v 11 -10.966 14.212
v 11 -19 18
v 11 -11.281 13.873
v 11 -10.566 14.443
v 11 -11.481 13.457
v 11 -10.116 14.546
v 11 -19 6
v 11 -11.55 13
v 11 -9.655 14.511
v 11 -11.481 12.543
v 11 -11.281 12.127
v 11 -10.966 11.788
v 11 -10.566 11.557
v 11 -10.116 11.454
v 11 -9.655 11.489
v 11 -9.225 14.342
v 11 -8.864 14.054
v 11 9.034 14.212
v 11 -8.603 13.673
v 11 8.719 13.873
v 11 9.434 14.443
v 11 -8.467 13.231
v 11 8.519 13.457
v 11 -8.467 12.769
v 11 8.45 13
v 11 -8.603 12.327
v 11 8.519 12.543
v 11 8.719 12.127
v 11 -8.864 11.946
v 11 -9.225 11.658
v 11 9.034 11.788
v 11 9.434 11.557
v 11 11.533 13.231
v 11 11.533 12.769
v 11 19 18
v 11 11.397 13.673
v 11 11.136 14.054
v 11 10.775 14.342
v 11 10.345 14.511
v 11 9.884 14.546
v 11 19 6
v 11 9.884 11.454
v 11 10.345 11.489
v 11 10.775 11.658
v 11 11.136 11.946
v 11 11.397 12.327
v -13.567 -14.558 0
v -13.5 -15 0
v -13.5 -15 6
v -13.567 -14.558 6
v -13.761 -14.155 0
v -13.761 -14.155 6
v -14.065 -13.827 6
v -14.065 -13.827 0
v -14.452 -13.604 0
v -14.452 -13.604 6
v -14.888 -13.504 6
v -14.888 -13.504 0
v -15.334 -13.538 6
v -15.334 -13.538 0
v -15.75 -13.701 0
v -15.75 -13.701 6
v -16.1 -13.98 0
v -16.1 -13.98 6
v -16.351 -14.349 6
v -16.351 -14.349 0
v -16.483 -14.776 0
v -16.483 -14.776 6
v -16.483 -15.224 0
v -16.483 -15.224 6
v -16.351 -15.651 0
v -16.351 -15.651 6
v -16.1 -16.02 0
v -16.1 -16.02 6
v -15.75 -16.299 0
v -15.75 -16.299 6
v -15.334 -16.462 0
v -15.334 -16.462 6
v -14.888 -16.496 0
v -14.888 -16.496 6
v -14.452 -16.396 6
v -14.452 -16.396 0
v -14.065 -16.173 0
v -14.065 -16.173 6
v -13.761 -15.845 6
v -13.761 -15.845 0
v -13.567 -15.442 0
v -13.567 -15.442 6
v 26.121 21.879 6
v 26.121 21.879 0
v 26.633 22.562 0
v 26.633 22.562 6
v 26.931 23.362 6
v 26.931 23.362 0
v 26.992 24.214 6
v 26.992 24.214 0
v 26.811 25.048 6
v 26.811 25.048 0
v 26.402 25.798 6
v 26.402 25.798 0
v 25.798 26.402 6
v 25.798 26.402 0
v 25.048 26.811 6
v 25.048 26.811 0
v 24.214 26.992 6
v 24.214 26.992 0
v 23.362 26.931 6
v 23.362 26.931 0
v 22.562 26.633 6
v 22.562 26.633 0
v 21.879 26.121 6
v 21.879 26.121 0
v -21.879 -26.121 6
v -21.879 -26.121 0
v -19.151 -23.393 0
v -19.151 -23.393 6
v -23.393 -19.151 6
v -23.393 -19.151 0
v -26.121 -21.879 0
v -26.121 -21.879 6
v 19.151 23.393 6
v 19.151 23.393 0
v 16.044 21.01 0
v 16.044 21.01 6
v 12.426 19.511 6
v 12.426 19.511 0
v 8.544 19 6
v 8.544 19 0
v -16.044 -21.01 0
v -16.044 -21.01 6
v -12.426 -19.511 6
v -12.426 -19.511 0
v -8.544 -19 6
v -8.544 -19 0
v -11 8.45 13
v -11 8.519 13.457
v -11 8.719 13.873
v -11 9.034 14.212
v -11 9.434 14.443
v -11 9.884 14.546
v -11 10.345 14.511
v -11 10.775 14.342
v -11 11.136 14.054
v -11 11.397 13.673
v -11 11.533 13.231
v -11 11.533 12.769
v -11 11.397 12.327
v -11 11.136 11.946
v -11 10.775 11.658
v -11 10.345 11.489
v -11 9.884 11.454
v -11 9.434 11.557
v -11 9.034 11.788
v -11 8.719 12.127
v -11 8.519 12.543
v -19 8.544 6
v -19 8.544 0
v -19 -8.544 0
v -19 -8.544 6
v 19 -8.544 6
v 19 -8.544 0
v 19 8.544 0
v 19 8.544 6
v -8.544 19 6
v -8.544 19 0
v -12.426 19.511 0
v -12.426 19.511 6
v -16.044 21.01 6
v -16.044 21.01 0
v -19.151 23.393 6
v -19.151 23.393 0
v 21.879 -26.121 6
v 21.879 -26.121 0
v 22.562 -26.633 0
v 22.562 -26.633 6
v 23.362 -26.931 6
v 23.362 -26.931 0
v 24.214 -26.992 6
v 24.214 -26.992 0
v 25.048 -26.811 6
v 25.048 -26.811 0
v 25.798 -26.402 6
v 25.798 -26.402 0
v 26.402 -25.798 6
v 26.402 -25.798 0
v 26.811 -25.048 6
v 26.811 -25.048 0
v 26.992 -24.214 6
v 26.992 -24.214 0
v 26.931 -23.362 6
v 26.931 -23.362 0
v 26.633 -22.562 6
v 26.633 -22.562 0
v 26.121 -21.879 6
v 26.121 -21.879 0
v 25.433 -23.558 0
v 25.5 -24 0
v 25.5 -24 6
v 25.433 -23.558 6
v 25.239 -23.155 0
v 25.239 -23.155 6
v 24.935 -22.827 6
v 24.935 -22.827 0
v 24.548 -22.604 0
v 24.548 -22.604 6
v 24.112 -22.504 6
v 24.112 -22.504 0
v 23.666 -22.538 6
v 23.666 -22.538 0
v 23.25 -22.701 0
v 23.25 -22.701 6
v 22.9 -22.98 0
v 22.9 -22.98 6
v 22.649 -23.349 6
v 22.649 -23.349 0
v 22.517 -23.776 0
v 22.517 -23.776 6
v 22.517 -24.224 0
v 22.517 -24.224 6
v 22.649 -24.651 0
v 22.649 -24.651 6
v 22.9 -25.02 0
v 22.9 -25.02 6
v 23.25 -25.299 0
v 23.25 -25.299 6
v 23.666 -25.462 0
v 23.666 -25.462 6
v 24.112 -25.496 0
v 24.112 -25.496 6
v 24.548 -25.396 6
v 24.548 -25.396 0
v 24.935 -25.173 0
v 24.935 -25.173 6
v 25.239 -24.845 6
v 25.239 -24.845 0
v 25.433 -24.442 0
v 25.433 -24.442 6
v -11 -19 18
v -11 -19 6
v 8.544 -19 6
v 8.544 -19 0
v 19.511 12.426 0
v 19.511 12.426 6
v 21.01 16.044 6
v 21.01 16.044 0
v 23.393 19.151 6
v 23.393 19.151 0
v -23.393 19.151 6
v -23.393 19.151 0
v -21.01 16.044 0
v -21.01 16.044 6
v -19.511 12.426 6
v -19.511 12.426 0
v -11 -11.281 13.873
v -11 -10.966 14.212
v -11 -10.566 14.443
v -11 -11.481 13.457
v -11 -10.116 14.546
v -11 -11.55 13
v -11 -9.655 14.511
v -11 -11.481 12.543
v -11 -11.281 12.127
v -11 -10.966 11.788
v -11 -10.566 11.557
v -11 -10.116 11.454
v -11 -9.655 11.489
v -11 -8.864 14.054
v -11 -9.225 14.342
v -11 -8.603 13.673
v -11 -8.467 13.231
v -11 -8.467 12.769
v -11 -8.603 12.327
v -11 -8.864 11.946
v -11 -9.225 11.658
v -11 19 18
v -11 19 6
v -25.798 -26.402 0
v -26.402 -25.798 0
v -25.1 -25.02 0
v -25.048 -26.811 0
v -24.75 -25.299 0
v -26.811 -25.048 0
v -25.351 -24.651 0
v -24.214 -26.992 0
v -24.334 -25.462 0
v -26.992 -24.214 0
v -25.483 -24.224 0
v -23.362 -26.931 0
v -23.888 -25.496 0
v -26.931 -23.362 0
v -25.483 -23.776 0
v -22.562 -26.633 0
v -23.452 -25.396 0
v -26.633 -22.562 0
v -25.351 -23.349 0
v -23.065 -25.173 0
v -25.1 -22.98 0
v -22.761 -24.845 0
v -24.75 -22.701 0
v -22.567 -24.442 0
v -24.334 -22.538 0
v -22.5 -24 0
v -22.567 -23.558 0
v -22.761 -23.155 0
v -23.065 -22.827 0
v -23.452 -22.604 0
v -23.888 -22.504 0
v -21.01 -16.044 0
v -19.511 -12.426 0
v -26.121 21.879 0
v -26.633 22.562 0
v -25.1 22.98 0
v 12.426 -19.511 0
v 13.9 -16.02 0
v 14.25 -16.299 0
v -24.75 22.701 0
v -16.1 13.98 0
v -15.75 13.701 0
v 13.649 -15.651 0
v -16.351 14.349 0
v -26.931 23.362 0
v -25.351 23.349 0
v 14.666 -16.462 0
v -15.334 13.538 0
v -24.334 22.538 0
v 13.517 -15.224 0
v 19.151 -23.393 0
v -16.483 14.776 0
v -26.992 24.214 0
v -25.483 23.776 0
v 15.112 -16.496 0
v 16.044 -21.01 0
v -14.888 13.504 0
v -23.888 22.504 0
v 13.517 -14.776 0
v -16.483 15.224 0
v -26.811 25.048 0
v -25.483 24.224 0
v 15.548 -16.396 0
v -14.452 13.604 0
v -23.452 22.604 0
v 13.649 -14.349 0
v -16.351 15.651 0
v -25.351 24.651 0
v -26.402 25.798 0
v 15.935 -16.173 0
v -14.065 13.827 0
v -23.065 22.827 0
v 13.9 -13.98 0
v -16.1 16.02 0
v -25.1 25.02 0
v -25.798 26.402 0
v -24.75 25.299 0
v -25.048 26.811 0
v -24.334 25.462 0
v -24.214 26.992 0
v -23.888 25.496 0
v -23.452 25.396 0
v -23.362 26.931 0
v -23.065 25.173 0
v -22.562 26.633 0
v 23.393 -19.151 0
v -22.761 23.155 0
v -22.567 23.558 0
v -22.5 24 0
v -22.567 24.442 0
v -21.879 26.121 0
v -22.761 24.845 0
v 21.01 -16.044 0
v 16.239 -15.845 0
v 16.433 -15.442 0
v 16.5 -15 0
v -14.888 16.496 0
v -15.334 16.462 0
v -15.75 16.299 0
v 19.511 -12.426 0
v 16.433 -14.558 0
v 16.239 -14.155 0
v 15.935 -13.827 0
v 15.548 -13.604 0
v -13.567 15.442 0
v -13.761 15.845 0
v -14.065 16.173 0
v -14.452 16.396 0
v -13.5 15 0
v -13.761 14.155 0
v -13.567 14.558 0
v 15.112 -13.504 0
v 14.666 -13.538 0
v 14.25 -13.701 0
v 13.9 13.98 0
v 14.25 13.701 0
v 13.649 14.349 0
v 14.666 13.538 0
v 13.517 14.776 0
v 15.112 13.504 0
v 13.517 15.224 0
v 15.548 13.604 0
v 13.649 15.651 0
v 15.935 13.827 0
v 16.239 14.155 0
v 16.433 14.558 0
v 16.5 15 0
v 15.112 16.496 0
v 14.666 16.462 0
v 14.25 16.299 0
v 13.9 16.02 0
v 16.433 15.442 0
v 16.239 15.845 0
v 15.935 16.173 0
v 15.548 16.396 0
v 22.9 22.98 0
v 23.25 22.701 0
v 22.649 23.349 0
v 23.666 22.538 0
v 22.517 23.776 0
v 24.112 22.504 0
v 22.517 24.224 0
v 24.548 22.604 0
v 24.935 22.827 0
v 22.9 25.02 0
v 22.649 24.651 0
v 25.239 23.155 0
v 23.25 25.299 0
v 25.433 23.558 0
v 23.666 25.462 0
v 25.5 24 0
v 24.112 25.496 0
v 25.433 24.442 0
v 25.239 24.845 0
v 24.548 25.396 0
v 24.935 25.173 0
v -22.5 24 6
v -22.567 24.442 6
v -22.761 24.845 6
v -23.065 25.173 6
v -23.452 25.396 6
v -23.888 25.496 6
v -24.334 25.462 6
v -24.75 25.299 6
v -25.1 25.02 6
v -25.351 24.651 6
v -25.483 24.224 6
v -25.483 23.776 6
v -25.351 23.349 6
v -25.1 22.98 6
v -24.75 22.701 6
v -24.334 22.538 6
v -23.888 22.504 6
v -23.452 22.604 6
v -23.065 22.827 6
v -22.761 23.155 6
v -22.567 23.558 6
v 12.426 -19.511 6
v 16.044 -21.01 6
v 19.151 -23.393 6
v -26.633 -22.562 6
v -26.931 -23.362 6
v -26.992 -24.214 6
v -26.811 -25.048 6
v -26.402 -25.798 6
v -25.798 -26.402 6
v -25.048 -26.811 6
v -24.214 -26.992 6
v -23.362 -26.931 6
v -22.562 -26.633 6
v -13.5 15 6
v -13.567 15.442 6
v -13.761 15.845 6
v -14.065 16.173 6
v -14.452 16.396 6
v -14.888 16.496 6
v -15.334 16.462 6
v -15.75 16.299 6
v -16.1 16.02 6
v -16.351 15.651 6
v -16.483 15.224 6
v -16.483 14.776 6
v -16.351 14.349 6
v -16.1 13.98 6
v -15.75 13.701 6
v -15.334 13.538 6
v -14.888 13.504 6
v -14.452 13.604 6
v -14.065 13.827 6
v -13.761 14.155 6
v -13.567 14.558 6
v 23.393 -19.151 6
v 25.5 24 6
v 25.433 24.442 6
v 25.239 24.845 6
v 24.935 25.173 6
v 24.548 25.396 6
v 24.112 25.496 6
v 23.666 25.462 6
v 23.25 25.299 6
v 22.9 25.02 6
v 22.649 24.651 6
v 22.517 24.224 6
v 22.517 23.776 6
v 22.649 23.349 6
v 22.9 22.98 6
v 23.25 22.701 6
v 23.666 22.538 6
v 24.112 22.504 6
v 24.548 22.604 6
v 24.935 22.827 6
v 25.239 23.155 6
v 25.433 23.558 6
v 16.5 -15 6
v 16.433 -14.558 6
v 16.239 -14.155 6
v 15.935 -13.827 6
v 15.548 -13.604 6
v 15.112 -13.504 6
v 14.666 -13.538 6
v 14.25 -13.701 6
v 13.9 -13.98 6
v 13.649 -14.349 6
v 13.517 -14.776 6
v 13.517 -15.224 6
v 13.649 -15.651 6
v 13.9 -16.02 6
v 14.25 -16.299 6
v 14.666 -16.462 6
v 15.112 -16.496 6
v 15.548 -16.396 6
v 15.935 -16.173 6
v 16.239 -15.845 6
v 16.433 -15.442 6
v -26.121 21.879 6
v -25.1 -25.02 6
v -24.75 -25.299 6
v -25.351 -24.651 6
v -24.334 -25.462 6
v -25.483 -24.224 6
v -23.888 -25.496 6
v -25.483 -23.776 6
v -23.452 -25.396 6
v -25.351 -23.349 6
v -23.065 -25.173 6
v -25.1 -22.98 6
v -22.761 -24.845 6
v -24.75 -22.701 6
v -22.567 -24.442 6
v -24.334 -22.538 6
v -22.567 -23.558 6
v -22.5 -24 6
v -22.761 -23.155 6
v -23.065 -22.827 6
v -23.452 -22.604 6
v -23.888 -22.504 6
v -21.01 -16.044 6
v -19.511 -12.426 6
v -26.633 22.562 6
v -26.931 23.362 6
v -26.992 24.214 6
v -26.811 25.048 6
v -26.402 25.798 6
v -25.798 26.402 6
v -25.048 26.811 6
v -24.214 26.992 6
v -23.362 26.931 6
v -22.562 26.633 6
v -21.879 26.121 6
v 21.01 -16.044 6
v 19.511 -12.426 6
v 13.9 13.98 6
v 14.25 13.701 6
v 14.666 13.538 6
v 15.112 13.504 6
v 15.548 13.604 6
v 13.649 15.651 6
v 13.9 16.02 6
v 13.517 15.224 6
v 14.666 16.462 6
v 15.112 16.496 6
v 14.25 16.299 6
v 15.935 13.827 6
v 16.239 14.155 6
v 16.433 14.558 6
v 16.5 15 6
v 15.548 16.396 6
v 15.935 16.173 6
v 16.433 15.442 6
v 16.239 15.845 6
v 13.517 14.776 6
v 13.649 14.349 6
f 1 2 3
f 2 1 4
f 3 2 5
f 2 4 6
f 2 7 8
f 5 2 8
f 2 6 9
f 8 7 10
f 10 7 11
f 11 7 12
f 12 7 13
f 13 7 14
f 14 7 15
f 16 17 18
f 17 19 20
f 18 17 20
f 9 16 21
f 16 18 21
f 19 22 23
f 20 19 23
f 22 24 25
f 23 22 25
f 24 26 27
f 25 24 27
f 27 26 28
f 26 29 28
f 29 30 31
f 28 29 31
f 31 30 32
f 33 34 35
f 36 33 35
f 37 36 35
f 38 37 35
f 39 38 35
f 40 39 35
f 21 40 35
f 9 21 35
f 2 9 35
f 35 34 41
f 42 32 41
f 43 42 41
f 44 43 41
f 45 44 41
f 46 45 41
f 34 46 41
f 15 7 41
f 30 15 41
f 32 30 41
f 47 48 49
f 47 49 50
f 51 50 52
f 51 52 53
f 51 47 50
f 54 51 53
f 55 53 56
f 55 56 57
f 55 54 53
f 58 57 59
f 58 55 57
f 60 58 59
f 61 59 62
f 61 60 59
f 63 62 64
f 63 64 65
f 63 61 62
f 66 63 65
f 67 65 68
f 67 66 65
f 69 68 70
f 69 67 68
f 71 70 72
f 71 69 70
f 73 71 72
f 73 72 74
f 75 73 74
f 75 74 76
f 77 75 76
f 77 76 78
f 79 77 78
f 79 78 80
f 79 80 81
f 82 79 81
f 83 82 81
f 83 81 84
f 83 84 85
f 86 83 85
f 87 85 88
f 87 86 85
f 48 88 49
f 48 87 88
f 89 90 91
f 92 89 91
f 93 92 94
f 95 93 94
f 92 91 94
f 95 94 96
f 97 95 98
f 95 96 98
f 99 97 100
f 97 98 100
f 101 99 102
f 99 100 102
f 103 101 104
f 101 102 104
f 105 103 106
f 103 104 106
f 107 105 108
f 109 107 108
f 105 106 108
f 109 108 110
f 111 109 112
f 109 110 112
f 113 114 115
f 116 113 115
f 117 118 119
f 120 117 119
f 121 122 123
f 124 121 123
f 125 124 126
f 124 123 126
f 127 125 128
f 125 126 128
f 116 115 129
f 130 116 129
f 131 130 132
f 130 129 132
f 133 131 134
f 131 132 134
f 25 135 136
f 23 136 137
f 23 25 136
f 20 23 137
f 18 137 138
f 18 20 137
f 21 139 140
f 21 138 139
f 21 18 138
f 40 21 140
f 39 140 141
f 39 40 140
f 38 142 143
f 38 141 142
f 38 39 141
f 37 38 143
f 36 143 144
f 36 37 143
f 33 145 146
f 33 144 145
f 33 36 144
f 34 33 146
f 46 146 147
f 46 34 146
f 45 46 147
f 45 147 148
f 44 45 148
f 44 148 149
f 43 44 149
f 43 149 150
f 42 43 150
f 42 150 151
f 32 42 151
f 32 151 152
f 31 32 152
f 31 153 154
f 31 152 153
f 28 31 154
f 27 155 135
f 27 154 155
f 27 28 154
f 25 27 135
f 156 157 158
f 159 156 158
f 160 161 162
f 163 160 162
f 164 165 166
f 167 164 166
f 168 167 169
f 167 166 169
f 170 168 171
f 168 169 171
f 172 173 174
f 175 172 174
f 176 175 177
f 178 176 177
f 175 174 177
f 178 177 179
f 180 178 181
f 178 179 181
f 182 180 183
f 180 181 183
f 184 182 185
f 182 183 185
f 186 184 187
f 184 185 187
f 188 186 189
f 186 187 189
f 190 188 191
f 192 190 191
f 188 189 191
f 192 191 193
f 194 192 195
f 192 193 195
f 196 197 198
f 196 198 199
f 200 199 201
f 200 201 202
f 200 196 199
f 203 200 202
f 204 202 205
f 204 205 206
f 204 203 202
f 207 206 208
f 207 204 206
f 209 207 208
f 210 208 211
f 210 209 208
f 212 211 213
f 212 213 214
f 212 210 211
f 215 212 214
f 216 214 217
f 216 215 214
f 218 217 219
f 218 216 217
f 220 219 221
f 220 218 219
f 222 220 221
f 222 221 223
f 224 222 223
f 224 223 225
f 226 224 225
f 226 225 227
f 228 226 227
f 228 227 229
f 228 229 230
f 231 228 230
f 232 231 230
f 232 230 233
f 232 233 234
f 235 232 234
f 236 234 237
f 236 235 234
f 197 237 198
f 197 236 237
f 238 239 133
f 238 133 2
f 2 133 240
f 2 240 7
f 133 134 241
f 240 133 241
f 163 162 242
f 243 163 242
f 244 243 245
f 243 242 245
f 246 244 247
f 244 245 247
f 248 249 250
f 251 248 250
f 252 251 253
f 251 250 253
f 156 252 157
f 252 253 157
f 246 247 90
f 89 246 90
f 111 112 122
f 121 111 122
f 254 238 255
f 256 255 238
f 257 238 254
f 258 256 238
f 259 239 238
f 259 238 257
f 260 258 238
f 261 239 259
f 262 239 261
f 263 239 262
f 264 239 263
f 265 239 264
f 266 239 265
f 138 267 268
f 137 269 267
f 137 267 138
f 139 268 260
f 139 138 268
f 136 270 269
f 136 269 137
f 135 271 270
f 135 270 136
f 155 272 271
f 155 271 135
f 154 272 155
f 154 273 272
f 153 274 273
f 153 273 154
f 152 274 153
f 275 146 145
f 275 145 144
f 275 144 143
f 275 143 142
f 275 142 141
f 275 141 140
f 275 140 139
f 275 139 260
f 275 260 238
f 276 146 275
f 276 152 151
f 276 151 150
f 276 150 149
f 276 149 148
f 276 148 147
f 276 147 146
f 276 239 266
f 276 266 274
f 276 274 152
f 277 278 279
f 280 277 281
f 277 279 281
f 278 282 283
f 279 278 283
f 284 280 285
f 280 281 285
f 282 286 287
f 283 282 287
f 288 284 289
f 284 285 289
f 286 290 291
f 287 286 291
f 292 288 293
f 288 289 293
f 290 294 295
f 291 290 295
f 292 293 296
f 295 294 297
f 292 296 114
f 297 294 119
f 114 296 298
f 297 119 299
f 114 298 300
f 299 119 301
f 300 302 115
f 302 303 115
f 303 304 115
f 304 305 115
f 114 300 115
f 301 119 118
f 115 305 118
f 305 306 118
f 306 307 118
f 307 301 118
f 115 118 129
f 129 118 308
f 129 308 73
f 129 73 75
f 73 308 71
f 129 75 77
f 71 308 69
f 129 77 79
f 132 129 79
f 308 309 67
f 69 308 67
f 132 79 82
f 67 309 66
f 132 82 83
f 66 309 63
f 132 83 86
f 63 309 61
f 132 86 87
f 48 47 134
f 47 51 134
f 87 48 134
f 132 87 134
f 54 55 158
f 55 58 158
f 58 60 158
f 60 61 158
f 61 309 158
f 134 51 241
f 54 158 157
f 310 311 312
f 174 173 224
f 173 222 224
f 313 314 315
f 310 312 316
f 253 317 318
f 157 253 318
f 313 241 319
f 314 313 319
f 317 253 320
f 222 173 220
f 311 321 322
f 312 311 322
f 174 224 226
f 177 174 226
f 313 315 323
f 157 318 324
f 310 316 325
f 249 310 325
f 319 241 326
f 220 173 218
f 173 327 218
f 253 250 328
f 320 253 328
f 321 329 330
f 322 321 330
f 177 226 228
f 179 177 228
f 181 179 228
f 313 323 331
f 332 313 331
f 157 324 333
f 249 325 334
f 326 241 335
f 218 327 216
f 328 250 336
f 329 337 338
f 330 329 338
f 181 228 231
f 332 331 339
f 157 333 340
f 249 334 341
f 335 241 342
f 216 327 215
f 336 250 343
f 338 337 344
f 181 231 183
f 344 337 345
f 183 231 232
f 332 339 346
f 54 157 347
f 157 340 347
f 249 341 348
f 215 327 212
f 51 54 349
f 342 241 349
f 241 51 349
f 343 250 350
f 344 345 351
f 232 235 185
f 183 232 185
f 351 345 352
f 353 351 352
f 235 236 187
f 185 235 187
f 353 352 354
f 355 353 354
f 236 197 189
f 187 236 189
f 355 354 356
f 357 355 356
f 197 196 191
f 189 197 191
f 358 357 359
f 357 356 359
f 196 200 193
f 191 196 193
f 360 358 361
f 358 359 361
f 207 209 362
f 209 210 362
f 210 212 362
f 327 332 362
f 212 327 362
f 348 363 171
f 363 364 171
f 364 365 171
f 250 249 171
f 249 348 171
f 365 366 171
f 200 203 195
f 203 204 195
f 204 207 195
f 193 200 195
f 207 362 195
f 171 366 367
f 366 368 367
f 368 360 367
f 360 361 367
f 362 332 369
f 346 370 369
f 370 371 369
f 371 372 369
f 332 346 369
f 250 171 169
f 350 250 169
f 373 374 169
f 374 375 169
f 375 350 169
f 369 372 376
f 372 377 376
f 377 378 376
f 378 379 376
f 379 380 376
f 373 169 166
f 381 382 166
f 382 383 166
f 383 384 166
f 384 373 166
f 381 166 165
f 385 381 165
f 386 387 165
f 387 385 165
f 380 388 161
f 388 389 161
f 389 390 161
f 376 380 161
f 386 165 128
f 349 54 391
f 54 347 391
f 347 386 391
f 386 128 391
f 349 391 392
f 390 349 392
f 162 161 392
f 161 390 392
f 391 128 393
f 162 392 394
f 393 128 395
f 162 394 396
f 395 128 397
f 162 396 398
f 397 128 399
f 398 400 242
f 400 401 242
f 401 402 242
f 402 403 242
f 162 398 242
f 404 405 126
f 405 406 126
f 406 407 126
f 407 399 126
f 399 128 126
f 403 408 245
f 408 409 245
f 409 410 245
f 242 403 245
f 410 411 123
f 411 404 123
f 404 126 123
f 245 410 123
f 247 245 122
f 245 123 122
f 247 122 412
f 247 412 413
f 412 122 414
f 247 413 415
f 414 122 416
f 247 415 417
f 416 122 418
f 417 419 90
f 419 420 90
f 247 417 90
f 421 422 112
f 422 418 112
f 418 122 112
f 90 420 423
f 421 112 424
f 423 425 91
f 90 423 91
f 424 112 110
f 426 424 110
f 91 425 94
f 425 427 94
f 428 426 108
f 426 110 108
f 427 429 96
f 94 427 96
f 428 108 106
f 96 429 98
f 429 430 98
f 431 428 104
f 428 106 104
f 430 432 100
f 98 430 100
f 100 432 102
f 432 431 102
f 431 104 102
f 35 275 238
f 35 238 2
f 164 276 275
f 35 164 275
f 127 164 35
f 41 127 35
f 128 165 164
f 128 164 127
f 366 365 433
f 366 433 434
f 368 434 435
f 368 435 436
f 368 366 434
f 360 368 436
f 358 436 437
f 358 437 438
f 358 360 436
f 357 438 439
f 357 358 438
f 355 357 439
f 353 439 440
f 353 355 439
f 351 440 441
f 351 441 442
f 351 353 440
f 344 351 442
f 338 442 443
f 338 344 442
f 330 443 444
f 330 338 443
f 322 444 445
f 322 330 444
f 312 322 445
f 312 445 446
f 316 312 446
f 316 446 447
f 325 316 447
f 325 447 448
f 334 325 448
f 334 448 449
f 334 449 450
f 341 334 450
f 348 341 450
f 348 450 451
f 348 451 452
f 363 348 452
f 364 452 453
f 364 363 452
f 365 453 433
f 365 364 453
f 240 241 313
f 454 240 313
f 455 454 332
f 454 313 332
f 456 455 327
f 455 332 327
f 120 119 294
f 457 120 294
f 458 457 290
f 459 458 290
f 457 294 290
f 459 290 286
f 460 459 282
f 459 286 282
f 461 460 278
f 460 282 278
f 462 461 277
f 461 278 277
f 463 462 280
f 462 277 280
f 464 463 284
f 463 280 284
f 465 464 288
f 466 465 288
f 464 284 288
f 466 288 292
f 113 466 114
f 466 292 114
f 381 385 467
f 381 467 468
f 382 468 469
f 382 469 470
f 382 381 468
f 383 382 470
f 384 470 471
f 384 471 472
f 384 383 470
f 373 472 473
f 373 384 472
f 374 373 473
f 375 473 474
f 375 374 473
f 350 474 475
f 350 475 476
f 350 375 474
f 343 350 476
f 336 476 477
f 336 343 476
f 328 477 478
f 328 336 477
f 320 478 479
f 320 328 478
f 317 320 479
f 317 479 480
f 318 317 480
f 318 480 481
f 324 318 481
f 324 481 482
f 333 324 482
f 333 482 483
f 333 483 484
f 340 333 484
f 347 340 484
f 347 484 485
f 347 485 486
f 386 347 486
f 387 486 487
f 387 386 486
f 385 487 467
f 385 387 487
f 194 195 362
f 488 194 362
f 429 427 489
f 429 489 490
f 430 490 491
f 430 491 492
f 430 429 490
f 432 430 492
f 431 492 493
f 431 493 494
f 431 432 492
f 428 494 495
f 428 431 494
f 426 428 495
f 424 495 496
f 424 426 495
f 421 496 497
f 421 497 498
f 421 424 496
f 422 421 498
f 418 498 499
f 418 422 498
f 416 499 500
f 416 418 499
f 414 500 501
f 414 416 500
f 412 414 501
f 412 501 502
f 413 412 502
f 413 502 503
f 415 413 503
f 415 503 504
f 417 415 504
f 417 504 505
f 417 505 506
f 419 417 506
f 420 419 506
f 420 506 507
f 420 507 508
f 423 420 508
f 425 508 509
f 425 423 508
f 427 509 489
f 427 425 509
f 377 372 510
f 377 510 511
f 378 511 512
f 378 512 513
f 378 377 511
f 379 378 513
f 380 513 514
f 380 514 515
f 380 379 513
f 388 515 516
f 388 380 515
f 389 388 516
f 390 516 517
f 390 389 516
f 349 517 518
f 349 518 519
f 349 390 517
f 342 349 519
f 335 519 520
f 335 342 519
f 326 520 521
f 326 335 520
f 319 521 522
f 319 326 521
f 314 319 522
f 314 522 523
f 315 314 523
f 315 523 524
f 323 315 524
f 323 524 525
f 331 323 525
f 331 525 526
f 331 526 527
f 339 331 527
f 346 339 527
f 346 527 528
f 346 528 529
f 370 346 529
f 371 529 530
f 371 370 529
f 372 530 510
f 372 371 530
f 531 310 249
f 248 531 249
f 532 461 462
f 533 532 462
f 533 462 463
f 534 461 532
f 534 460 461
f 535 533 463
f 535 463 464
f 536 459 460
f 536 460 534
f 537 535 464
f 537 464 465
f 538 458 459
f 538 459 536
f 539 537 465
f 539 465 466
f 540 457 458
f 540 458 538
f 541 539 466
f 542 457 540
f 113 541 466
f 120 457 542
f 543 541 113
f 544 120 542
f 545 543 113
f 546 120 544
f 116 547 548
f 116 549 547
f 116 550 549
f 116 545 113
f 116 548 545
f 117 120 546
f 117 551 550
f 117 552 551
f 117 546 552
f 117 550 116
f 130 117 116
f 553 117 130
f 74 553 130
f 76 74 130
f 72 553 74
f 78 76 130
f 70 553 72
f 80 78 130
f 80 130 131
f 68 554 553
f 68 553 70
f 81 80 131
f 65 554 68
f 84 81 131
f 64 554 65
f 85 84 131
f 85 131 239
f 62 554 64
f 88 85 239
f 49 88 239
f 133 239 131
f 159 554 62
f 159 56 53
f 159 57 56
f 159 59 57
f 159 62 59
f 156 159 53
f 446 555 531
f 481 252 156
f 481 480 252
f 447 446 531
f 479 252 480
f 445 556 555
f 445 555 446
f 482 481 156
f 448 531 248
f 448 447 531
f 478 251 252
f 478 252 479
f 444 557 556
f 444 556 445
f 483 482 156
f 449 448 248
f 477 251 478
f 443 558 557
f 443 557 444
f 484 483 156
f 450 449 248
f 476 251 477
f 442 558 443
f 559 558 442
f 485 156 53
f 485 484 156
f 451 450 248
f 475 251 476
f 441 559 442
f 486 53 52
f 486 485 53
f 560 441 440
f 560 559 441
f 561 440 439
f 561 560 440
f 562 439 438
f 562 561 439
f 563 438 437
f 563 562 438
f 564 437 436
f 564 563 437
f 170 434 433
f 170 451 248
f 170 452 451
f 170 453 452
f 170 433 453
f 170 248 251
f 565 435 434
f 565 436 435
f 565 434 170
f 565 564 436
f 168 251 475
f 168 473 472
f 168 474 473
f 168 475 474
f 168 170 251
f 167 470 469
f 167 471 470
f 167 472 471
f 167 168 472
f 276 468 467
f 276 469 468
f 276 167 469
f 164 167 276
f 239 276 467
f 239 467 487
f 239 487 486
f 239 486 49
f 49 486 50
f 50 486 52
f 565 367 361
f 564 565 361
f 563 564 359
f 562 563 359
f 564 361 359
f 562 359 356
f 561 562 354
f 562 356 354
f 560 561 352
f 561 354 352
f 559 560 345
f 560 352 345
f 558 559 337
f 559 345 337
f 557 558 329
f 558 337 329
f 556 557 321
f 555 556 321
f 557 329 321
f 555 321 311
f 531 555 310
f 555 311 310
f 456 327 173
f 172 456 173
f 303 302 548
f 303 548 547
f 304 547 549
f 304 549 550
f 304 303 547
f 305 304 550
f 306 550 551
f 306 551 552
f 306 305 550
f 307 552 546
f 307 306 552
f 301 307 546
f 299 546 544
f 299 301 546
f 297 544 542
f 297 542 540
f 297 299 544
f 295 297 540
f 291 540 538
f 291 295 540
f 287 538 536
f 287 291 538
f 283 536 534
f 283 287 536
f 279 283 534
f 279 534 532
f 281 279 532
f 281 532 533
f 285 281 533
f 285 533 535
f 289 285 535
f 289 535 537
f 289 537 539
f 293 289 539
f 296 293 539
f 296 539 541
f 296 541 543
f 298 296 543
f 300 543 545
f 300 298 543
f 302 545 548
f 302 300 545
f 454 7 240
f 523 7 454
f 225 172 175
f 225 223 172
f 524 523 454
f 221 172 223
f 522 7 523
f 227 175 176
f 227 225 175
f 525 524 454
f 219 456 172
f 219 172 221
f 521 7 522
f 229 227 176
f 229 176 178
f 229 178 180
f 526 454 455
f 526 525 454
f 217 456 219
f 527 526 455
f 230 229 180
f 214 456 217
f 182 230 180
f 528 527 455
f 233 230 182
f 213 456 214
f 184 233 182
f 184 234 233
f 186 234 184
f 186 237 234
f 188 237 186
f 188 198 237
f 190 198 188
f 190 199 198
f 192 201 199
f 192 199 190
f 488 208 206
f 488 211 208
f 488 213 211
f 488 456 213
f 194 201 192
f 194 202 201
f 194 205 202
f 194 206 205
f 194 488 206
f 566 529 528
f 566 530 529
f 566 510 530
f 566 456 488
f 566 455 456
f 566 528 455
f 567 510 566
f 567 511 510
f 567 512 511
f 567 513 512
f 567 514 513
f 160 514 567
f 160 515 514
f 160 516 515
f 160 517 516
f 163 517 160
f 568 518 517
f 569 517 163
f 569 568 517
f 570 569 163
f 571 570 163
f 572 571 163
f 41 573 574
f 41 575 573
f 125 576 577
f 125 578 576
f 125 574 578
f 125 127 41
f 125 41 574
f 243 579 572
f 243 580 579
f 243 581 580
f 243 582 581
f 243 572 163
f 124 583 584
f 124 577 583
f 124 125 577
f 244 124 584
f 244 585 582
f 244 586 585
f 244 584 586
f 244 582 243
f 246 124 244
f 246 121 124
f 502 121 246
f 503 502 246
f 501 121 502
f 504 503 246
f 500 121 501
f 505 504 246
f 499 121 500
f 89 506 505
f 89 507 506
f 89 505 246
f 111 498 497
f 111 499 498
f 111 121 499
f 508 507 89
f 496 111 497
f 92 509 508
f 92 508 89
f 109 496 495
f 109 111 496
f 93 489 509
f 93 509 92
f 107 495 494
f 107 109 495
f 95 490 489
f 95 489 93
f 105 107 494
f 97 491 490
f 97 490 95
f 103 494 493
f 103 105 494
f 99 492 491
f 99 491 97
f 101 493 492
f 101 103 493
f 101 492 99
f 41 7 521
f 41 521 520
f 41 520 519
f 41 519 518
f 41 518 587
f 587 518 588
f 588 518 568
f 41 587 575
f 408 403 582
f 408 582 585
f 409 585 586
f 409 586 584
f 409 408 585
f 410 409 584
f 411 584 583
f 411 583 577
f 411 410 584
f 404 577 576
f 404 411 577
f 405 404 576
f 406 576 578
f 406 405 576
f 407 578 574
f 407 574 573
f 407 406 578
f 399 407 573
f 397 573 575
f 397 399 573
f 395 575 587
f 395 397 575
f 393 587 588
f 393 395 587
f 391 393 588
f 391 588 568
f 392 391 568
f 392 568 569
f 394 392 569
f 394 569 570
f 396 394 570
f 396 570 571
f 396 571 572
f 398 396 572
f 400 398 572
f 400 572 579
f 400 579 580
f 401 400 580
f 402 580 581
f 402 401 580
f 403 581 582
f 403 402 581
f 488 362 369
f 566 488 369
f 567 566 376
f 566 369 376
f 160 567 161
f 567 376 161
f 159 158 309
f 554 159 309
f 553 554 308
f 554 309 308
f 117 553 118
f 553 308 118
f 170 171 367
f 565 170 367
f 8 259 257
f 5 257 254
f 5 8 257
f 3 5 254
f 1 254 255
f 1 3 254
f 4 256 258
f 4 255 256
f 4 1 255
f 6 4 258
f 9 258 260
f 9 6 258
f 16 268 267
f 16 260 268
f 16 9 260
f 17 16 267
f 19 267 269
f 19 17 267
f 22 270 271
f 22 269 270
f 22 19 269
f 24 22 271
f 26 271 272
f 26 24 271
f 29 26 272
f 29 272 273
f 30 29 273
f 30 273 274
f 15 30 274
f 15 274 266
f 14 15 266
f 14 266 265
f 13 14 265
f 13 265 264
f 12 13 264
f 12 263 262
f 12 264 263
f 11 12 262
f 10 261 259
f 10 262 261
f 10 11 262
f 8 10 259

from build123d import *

# Parameters (mm, degrees)
SKETCH2_R               = 1.5
BOSS_EXTRUDE2_DEPTH     = 6
SKETCH3_W               = 22
SKETCH3_H               = 38
BOSS_EXTRUDE3_DEPTH     = 12
CUT_EXTRUDE1_DEPTH      = 50.969990995
CUT_EXTRUDE1_DEPTH_BACK = 50.969990995
SKETCH5_R               = 1.55


with BuildPart() as part:
    # Sketch2 → Boss-Extrude2 (new body)
    with BuildSketch(Plane.XY):
        with BuildLine():
            Line((8.544155877, 19), (-8.544155877, 19))
            ThreePointArc((-8.544155877, 19), (-14.284407363, 20.141807012), (-19.150757595, 23.393398282))
            Line((-19.150757595, 23.393398282), (-21.878679656, 26.121320344))
            ThreePointArc((-21.878679656, 26.121320344), (-26.121320344, 26.121320344), (-26.121320344, 21.878679656))
            Line((-26.121320344, 21.878679656), (-23.393398282, 19.150757595))
            ThreePointArc((-23.393398282, 19.150757595), (-20.141807012, 14.284407363), (-19, 8.544155877))
            Line((-19, 8.544155877), (-19, -8.544155877))
            ThreePointArc((-19, -8.544155877), (-20.141807012, -14.284407363), (-23.393398282, -19.150757595))
            Line((-23.393398282, -19.150757595), (-26.121320344, -21.878679656))
            ThreePointArc((-26.121320344, -21.878679656), (-26.121320344, -26.121320344), (-21.878679656, -26.121320344))
            Line((-21.878679656, -26.121320344), (-19.150757595, -23.393398282))
            ThreePointArc((-19.150757595, -23.393398282), (-14.284407363, -20.141807012), (-8.544155877, -19))
            Line((-8.544155877, -19), (8.544155877, -19))
            ThreePointArc((8.544155877, -19), (14.284407363, -20.141807012), (19.150757595, -23.393398282))
            Line((19.150757595, -23.393398282), (21.878679656, -26.121320344))
            ThreePointArc((21.878679656, -26.121320344), (26.121320344, -26.121320344), (26.121320344, -21.878679656))
            Line((26.121320344, -21.878679656), (23.393398282, -19.150757595))
            ThreePointArc((23.393398282, -19.150757595), (20.141807012, -14.284407363), (19, -8.544155877))
            Line((19, -8.544155877), (19, 8.544155877))
            ThreePointArc((19, 8.544155877), (20.141807012, 14.284407363), (23.393398282, 19.150757595))
            Line((23.393398282, 19.150757595), (26.121320344, 21.878679656))
            ThreePointArc((26.121320344, 21.878679656), (26.121320344, 26.121320344), (21.878679656, 26.121320344))
            Line((21.878679656, 26.121320344), (19.150757595, 23.393398282))
            ThreePointArc((19.150757595, 23.393398282), (14.284407363, 20.141807012), (8.544155877, 19))
        make_face()
        with Locations((15, 15)):
            Circle(SKETCH2_R, mode=Mode.SUBTRACT)
        with Locations((24, 24)):
            Circle(SKETCH2_R, mode=Mode.SUBTRACT)
        with Locations((24, -24)):
            Circle(SKETCH2_R, mode=Mode.SUBTRACT)
        with Locations((15, -15)):
            Circle(SKETCH2_R, mode=Mode.SUBTRACT)
        with Locations((-24, -24)):
            Circle(SKETCH2_R, mode=Mode.SUBTRACT)
        with Locations((-15, -15)):
            Circle(SKETCH2_R, mode=Mode.SUBTRACT)
        with Locations((-24, 24)):
            Circle(SKETCH2_R, mode=Mode.SUBTRACT)
        with Locations((-15, 15)):
            Circle(SKETCH2_R, mode=Mode.SUBTRACT)
    extrude(amount=BOSS_EXTRUDE2_DEPTH)

    # Sketch3 → Boss-Extrude3 (add)
    with BuildSketch(Plane.XY.offset(6)):
        Rectangle(SKETCH3_W, SKETCH3_H)
    extrude(amount=BOSS_EXTRUDE3_DEPTH)

    # Sketch5 → Cut-Extrude1 (cut, two sides: drawn at the far end of the back side and taken through both)
    with BuildSketch(Plane.ZY.offset(11).offset(-CUT_EXTRUDE1_DEPTH_BACK)):
        with Locations((13, -10)):
            Circle(SKETCH5_R)
        with Locations((13, 10)):
            Circle(SKETCH5_R)
    extrude(amount=CUT_EXTRUDE1_DEPTH + CUT_EXTRUDE1_DEPTH_BACK, mode=Mode.SUBTRACT)


solid = part.part
